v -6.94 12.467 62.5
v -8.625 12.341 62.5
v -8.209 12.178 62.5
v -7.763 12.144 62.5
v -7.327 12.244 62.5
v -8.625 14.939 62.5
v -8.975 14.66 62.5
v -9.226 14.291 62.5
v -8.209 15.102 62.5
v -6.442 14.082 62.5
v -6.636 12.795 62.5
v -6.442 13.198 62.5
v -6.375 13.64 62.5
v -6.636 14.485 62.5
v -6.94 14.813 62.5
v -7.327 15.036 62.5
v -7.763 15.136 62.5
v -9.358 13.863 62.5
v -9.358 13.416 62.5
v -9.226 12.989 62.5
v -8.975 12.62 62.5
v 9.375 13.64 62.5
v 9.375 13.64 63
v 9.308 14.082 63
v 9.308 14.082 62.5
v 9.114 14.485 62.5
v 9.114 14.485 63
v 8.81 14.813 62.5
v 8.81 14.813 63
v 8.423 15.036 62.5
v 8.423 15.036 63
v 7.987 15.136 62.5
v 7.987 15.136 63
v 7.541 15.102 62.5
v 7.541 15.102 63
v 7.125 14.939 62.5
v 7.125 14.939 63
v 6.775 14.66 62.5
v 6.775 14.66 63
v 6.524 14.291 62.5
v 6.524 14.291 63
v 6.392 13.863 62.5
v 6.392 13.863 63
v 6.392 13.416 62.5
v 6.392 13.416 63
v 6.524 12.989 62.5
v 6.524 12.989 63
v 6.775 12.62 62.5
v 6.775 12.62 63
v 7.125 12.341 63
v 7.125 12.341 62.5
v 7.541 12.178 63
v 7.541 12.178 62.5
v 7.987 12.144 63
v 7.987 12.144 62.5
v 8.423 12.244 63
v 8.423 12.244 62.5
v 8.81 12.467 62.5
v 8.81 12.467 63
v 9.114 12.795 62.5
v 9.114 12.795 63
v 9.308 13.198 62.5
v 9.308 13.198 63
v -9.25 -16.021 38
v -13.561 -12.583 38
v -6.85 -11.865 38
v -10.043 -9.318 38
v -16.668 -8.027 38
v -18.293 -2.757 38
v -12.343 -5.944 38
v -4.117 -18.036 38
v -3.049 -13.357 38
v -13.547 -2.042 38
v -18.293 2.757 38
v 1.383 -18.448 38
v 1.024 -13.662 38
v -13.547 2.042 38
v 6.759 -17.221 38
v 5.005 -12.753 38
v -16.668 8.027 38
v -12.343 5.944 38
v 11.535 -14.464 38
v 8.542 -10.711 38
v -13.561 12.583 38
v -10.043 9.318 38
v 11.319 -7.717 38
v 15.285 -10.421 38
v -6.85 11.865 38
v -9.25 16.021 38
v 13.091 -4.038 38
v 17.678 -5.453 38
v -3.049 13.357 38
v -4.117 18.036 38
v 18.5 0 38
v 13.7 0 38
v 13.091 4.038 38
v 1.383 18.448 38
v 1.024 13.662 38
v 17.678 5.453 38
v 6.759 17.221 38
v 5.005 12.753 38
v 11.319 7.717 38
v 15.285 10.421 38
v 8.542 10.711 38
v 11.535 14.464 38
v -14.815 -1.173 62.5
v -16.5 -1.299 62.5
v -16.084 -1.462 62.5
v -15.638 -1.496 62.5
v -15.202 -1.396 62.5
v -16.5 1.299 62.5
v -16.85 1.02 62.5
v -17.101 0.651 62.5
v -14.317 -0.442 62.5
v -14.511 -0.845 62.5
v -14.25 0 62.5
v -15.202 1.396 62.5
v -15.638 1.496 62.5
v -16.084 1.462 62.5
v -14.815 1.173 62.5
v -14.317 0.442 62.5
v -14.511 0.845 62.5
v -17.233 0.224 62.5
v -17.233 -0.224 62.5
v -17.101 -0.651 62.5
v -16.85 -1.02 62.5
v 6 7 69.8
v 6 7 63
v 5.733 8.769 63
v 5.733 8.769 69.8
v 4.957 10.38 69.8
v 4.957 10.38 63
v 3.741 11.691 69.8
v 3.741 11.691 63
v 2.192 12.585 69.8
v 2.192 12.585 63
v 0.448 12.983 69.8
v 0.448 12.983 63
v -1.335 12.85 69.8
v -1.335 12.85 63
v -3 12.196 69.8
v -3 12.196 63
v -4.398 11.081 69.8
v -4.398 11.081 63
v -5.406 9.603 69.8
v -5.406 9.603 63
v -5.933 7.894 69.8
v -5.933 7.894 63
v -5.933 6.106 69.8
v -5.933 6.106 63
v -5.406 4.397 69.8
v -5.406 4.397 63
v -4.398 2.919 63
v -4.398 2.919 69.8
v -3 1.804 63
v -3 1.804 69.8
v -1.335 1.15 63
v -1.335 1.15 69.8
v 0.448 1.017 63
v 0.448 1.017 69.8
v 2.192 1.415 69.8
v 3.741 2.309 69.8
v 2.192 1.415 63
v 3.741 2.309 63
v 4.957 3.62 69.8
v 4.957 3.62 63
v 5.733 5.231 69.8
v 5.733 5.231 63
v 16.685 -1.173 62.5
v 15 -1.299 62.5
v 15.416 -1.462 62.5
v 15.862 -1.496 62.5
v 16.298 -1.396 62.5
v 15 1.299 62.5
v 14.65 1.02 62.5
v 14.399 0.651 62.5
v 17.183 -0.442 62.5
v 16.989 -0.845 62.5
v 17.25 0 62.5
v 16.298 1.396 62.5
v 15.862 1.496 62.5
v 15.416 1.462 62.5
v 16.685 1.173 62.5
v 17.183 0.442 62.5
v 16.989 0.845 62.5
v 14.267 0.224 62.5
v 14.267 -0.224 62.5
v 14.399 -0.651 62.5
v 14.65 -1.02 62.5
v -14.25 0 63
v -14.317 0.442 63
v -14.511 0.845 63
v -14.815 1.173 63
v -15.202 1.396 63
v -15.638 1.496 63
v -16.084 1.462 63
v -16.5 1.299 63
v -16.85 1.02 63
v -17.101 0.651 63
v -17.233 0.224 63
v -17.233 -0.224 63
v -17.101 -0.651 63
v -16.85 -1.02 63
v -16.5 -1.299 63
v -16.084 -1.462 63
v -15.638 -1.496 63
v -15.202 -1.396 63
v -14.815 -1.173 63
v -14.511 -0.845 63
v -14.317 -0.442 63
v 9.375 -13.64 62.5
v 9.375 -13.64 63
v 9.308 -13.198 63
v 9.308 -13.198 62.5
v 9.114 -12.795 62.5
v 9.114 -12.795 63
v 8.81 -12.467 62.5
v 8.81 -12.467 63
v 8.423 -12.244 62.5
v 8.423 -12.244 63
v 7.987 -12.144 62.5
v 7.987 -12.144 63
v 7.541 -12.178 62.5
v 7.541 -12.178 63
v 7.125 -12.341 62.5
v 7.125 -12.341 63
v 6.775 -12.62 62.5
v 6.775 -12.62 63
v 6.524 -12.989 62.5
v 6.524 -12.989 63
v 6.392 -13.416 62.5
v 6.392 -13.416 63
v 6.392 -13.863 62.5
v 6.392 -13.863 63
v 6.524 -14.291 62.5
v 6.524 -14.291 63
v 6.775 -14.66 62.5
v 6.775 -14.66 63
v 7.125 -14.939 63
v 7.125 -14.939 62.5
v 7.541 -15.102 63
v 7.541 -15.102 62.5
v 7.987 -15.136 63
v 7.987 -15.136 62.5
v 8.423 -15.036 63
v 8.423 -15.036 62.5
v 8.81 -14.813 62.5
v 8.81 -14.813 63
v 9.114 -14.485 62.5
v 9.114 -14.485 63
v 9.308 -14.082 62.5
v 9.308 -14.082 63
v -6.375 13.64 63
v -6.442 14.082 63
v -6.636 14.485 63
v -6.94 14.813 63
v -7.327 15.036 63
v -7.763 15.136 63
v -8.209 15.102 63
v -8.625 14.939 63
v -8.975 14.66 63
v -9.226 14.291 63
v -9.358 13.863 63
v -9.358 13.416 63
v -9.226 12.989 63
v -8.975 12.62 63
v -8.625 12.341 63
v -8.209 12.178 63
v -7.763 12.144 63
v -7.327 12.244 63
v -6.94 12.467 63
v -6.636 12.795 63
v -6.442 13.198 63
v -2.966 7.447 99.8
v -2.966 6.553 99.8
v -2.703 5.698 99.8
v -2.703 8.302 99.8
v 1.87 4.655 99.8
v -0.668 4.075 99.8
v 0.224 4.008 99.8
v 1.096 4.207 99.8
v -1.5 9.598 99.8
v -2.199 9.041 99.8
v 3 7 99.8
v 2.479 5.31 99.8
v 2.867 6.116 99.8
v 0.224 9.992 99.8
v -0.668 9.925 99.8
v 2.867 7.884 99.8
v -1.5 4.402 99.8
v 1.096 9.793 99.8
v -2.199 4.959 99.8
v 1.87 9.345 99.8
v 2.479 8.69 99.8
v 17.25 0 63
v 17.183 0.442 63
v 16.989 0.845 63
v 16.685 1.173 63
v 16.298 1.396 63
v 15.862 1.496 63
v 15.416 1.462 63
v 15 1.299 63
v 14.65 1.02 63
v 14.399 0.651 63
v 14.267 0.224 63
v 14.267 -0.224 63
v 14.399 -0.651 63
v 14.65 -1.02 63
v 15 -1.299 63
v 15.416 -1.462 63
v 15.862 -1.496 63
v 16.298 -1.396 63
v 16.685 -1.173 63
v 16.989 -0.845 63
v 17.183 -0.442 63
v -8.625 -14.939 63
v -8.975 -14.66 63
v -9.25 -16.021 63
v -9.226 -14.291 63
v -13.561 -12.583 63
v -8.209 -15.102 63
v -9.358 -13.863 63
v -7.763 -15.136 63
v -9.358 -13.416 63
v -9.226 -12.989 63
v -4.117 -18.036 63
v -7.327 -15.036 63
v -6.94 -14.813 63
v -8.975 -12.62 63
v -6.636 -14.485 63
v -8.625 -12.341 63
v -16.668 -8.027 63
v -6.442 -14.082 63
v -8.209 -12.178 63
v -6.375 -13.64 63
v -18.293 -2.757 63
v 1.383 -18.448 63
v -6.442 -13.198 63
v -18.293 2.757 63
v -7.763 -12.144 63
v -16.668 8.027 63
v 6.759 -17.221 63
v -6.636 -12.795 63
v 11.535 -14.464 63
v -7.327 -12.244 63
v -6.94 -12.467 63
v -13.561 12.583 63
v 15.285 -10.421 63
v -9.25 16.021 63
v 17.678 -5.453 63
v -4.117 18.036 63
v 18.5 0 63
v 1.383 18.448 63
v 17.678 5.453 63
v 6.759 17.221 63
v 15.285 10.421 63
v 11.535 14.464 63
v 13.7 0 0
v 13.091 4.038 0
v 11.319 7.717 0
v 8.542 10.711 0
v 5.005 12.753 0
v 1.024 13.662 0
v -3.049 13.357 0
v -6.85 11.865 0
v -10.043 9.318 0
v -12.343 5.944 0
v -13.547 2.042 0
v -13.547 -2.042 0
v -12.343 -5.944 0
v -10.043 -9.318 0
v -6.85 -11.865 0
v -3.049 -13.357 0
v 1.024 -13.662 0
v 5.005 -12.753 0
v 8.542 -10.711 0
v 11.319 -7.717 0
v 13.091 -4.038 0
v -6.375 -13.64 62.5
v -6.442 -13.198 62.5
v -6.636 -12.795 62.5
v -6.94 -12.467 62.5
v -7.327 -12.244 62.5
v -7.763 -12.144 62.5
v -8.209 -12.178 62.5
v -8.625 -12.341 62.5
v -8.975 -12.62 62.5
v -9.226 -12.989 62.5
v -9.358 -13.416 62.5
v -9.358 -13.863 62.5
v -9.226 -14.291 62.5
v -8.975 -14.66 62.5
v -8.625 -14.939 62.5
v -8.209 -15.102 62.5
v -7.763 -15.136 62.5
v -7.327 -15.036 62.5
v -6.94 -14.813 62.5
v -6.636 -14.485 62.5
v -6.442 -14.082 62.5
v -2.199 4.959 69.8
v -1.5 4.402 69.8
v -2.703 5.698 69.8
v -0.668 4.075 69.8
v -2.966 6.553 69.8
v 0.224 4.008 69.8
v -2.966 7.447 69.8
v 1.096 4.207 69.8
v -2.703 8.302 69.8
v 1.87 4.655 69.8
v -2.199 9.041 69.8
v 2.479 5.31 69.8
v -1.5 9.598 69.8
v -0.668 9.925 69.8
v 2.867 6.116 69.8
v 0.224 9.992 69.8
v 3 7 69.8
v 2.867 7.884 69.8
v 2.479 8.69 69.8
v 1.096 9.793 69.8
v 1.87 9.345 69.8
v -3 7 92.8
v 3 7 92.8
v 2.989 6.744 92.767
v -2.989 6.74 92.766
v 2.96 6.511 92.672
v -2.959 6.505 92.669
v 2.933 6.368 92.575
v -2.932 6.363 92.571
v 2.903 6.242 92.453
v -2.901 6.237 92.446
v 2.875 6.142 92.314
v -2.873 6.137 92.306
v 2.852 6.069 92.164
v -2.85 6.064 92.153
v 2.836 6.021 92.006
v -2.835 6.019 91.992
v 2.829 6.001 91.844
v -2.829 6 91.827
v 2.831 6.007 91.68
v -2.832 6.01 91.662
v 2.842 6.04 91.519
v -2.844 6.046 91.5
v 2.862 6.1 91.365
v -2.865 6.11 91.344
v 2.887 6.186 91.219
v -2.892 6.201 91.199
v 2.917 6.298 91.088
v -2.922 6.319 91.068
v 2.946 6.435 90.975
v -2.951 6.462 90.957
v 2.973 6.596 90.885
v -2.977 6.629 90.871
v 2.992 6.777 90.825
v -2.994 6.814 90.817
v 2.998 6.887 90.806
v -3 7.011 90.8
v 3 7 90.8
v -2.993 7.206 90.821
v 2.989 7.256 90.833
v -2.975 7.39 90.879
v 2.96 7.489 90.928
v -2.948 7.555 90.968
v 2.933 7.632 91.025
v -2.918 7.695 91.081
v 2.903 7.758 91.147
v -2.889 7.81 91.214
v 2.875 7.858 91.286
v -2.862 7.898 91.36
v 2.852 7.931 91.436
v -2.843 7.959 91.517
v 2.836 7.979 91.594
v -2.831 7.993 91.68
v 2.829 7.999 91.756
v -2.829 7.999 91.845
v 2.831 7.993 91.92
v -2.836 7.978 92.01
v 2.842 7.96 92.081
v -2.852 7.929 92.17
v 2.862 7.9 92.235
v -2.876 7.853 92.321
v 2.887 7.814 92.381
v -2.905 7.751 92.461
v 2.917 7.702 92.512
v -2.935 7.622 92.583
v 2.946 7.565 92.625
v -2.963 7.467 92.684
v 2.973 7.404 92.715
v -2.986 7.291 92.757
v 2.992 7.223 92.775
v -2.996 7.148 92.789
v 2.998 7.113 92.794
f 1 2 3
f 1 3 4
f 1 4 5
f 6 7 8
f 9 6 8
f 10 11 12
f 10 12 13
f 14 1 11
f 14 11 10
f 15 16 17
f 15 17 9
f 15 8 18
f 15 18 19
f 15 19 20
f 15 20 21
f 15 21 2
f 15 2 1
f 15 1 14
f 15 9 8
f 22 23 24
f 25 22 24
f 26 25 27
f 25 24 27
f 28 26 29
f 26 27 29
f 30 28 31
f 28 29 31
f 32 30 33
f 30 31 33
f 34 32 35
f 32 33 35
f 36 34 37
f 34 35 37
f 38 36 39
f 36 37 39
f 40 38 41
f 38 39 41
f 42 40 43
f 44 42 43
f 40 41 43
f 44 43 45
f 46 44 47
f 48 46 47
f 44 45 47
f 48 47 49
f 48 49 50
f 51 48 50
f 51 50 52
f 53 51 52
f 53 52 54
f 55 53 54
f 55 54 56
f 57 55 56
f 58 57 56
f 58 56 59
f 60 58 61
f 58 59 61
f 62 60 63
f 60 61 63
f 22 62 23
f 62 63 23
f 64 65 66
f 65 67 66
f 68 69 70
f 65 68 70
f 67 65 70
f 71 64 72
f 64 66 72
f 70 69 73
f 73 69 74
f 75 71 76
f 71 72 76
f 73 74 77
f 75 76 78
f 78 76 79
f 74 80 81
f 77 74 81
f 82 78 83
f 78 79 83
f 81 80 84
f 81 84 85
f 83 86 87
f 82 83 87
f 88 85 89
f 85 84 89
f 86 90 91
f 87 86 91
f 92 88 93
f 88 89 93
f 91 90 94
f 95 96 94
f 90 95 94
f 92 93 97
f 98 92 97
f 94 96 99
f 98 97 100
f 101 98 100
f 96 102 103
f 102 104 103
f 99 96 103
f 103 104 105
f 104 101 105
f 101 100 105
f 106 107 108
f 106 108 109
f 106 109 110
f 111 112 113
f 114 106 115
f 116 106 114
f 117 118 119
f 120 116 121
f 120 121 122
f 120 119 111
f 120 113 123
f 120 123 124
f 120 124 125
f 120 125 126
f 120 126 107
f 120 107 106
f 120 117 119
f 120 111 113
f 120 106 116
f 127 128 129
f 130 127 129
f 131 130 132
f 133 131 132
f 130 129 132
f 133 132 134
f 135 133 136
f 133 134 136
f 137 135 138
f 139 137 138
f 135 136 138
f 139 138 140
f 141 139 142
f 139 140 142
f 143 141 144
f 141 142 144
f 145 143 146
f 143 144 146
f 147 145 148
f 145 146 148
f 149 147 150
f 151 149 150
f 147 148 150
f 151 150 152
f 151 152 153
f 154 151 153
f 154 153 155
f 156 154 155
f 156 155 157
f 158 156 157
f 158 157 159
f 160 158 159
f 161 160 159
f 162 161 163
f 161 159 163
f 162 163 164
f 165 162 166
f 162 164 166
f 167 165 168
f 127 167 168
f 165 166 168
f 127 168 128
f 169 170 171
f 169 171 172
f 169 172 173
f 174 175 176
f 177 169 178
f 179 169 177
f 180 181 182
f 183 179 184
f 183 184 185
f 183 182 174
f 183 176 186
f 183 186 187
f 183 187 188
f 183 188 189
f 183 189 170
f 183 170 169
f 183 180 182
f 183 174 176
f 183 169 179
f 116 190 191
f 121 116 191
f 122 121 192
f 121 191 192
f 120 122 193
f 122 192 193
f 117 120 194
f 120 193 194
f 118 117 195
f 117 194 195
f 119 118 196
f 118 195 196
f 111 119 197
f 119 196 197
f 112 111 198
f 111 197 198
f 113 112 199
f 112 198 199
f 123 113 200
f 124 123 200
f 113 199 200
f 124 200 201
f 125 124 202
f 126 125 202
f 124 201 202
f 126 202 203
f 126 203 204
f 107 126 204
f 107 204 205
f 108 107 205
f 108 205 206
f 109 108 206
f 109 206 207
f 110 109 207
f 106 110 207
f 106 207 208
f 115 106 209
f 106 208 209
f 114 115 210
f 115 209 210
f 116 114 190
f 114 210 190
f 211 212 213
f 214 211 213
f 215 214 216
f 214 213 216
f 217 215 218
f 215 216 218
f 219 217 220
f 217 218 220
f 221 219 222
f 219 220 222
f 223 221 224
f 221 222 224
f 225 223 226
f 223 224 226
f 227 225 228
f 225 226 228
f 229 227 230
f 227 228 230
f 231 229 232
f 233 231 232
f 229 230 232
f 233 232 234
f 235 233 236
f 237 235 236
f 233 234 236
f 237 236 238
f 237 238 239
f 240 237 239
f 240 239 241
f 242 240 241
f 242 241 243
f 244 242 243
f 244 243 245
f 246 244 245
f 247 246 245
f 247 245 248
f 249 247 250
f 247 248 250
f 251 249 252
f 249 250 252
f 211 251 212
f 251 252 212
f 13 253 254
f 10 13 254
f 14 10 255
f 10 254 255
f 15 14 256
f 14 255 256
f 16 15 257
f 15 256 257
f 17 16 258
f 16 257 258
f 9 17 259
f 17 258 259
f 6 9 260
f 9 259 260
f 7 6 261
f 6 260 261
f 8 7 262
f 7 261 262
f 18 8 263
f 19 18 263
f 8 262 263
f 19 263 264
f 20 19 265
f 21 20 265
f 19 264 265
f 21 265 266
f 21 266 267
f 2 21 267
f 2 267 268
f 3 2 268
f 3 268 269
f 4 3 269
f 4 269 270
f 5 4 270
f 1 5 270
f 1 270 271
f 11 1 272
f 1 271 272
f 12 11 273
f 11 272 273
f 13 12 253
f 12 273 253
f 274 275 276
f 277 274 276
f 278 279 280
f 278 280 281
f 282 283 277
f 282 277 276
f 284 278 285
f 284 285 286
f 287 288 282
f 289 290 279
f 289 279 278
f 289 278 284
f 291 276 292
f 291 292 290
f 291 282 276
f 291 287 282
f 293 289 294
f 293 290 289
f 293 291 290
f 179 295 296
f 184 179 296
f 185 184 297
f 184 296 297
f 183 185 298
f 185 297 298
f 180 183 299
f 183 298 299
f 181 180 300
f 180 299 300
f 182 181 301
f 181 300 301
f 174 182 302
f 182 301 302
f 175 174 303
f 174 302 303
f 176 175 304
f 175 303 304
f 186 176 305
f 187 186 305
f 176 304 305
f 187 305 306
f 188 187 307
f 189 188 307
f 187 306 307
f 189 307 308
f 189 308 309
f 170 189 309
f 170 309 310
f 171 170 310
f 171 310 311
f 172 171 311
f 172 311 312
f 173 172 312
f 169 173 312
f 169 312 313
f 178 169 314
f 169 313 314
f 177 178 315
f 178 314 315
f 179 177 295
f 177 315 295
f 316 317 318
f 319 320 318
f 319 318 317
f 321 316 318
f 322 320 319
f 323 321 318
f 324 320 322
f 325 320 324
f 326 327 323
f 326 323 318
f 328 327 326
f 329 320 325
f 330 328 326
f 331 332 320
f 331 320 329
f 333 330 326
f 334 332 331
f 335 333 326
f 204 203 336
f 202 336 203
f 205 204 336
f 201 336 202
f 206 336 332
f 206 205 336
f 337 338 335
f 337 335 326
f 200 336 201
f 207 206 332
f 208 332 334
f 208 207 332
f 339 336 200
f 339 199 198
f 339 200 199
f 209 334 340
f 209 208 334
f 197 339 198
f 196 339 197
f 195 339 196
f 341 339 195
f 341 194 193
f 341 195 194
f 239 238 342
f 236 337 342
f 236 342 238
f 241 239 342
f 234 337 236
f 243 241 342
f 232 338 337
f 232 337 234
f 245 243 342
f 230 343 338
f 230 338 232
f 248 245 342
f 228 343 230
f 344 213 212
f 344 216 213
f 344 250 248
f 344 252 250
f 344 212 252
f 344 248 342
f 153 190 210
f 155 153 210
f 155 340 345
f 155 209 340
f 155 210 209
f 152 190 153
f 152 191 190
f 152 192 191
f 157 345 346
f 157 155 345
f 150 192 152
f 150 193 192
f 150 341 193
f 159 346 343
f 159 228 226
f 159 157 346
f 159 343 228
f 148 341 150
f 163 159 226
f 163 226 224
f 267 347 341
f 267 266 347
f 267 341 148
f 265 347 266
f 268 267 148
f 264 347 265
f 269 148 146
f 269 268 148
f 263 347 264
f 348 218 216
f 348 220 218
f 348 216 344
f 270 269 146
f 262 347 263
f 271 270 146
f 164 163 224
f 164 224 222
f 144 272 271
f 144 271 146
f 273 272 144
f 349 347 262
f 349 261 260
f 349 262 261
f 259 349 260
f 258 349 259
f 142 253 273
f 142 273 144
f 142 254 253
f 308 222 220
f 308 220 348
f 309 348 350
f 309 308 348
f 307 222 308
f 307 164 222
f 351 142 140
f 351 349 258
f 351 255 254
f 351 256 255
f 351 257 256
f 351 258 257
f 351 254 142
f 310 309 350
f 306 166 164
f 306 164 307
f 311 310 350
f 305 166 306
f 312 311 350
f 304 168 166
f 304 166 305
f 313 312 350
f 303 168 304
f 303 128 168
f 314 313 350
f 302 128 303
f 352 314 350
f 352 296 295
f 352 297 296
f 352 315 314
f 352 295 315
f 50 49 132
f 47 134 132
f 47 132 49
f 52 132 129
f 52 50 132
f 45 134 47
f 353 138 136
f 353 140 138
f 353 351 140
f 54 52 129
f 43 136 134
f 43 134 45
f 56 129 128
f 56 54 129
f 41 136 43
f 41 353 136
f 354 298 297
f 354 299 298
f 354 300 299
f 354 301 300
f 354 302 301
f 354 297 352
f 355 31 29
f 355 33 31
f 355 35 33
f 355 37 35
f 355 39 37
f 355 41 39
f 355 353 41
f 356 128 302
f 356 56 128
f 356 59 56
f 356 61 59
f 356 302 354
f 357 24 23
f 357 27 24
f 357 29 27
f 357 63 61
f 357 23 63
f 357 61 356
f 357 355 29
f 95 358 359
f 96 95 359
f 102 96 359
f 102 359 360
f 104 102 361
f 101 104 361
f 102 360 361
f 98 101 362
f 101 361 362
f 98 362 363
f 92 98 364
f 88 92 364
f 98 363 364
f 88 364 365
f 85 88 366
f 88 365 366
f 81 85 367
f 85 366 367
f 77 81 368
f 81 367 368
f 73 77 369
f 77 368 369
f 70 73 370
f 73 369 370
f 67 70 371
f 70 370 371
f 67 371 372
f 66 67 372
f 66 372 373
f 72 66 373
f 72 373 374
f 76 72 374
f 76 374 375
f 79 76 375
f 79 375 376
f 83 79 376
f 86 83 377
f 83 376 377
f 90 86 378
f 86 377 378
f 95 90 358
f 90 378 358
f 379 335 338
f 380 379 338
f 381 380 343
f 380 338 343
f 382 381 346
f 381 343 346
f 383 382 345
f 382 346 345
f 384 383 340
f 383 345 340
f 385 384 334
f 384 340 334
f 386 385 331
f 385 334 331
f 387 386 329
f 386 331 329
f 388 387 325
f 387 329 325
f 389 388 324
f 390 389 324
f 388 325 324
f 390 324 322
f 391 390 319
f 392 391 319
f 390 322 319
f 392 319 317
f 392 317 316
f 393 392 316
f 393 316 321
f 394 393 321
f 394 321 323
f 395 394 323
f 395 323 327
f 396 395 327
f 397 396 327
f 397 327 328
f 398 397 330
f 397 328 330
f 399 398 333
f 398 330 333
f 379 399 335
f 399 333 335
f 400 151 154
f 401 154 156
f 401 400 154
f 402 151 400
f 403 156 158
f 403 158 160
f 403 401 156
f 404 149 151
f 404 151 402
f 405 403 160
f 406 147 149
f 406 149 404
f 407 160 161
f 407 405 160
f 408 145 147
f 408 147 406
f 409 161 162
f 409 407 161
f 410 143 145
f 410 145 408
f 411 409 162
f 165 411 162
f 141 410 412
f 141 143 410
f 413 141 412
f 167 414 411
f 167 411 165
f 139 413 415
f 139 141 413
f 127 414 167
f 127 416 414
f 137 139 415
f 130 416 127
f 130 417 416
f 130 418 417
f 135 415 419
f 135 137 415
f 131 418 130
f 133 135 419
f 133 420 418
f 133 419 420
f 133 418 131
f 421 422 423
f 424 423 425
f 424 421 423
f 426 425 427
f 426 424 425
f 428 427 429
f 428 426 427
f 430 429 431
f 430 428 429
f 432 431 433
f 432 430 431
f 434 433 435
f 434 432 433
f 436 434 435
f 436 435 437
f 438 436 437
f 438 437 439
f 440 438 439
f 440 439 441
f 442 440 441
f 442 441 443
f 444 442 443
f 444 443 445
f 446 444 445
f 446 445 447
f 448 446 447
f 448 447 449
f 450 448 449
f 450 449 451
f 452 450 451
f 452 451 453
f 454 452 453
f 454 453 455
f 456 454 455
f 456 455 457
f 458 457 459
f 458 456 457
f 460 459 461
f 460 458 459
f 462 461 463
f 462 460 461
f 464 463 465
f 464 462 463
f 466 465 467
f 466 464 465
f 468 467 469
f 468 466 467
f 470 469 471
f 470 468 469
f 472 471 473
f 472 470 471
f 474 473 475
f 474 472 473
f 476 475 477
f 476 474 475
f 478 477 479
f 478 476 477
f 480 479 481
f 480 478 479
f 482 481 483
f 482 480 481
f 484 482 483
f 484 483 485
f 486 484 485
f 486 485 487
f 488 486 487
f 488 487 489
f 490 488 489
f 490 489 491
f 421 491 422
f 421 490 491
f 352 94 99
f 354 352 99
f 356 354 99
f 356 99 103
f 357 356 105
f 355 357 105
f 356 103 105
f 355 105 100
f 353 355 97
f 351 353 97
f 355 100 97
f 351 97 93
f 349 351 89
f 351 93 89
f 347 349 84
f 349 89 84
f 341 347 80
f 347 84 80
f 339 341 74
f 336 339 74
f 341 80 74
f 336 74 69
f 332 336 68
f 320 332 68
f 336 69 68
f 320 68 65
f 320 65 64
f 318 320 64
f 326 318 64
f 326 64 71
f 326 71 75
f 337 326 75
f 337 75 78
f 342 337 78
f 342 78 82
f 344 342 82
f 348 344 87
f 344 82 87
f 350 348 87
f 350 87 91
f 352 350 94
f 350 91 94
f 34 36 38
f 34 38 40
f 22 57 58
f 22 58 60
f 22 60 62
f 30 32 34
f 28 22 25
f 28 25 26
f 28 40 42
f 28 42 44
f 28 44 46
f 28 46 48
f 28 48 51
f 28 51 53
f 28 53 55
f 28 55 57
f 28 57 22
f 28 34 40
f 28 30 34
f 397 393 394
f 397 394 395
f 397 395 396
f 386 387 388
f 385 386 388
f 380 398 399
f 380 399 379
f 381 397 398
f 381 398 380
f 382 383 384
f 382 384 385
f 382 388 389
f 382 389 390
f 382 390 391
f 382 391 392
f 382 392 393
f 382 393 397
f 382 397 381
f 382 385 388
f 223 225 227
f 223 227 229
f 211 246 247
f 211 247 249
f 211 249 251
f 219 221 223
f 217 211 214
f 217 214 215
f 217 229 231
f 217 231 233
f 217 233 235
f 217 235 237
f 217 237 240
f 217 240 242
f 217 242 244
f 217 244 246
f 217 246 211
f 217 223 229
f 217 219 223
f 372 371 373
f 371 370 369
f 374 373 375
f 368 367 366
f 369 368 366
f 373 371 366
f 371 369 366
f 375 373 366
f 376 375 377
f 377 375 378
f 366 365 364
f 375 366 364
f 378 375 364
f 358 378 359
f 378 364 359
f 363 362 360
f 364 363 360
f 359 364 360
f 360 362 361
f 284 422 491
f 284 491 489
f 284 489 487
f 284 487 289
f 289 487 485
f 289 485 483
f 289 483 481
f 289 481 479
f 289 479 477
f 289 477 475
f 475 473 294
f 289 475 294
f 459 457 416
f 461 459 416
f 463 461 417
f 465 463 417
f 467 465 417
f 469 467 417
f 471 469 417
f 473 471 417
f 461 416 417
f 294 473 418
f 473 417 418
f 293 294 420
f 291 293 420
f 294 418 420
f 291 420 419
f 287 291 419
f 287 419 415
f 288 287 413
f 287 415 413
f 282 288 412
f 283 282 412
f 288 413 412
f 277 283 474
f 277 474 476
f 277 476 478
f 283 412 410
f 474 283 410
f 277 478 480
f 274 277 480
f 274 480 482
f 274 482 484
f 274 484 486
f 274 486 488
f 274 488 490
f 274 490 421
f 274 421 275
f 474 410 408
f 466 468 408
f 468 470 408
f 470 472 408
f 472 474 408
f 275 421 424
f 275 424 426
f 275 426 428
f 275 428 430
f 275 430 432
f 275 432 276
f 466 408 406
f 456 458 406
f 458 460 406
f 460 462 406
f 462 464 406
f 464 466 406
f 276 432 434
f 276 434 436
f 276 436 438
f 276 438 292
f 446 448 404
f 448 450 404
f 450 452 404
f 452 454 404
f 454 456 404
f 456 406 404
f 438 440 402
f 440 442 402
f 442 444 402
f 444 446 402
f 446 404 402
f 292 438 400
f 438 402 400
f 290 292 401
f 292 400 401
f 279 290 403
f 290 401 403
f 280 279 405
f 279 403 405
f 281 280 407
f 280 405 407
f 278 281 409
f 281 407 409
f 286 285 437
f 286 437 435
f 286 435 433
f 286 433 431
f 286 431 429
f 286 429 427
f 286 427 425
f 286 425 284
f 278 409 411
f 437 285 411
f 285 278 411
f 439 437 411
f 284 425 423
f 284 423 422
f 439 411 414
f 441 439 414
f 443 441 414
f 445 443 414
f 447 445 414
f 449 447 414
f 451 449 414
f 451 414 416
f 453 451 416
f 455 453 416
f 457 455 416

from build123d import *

# Parameters (mm, degrees)
SKETCH1_R               = 13.7
BOSS_EXTRUDE1_DEPTH     = 38
SKETCH2_R               = 18.5
BOSS_EXTRUDE2_DEPTH     = 25
SKETCH3_R               = 6
BOSS_EXTRUDE3_DEPTH     = 6.8
SKETCH4_R               = 3
BOSS_EXTRUDE4_DEPTH     = 30
SKETCH5_R               = 1.5
CUT_EXTRUDE1_DEPTH      = 0.5
CUT_EXTRUDE2_DEPTH      = 104.172380025
CUT_EXTRUDE2_DEPTH_BACK = 104.172380025
SKETCH6_R               = 1


with BuildPart() as part:
    # Sketch1 → Boss-Extrude1 (new body)
    with BuildSketch(Plane.XY):
        Circle(SKETCH1_R)
    extrude(amount=BOSS_EXTRUDE1_DEPTH)

    # Sketch2 → Boss-Extrude2 (add)
    with BuildSketch(Plane.XY.offset(38)):
        Circle(SKETCH2_R)
    extrude(amount=BOSS_EXTRUDE2_DEPTH)

    # Sketch3 → Boss-Extrude3 (add)
    with BuildSketch(Plane.XY.offset(63)):
        with Locations((0, 7)):
            Circle(SKETCH3_R)
    extrude(amount=BOSS_EXTRUDE3_DEPTH)

    # Sketch4 → Boss-Extrude4 (add)
    with BuildSketch(Plane.XY.offset(69.8)):
        with Locations((0, 7)):
            Circle(SKETCH4_R)
    extrude(amount=BOSS_EXTRUDE4_DEPTH)

    # Sketch5 → Cut-Extrude1 (cut)
    with BuildSketch(Plane.XY.offset(63)):
        with Locations((-15.75, 0)):
            Circle(SKETCH5_R)
        with Locations((-7.875, 13.63990011)):
            Circle(SKETCH5_R)
        with Locations((7.875, 13.63990011)):
            Circle(SKETCH5_R)
        with Locations((15.75, 0)):
            Circle(SKETCH5_R)
        with Locations((7.875, -13.63990011)):
            Circle(SKETCH5_R)
        with Locations((-7.875, -13.63990011)):
            Circle(SKETCH5_R)
    extrude(amount=-CUT_EXTRUDE1_DEPTH, mode=Mode.SUBTRACT)

    # Sketch6 → Cut-Extrude2 (cut, two sides: drawn at the far end of the back side and taken through both)
    with BuildSketch(Plane(origin=(0, 0, 0), x_dir=(0, 0, -1), z_dir=(1, 0, 0)).offset(-CUT_EXTRUDE2_DEPTH_BACK)):
        with Locations(Location((-91.8, 7, 0), (0, 0, 180))):
            Circle(SKETCH6_R)
    extrude(amount=CUT_EXTRUDE2_DEPTH + CUT_EXTRUDE2_DEPTH_BACK, mode=Mode.SUBTRACT)


solid = part.part
